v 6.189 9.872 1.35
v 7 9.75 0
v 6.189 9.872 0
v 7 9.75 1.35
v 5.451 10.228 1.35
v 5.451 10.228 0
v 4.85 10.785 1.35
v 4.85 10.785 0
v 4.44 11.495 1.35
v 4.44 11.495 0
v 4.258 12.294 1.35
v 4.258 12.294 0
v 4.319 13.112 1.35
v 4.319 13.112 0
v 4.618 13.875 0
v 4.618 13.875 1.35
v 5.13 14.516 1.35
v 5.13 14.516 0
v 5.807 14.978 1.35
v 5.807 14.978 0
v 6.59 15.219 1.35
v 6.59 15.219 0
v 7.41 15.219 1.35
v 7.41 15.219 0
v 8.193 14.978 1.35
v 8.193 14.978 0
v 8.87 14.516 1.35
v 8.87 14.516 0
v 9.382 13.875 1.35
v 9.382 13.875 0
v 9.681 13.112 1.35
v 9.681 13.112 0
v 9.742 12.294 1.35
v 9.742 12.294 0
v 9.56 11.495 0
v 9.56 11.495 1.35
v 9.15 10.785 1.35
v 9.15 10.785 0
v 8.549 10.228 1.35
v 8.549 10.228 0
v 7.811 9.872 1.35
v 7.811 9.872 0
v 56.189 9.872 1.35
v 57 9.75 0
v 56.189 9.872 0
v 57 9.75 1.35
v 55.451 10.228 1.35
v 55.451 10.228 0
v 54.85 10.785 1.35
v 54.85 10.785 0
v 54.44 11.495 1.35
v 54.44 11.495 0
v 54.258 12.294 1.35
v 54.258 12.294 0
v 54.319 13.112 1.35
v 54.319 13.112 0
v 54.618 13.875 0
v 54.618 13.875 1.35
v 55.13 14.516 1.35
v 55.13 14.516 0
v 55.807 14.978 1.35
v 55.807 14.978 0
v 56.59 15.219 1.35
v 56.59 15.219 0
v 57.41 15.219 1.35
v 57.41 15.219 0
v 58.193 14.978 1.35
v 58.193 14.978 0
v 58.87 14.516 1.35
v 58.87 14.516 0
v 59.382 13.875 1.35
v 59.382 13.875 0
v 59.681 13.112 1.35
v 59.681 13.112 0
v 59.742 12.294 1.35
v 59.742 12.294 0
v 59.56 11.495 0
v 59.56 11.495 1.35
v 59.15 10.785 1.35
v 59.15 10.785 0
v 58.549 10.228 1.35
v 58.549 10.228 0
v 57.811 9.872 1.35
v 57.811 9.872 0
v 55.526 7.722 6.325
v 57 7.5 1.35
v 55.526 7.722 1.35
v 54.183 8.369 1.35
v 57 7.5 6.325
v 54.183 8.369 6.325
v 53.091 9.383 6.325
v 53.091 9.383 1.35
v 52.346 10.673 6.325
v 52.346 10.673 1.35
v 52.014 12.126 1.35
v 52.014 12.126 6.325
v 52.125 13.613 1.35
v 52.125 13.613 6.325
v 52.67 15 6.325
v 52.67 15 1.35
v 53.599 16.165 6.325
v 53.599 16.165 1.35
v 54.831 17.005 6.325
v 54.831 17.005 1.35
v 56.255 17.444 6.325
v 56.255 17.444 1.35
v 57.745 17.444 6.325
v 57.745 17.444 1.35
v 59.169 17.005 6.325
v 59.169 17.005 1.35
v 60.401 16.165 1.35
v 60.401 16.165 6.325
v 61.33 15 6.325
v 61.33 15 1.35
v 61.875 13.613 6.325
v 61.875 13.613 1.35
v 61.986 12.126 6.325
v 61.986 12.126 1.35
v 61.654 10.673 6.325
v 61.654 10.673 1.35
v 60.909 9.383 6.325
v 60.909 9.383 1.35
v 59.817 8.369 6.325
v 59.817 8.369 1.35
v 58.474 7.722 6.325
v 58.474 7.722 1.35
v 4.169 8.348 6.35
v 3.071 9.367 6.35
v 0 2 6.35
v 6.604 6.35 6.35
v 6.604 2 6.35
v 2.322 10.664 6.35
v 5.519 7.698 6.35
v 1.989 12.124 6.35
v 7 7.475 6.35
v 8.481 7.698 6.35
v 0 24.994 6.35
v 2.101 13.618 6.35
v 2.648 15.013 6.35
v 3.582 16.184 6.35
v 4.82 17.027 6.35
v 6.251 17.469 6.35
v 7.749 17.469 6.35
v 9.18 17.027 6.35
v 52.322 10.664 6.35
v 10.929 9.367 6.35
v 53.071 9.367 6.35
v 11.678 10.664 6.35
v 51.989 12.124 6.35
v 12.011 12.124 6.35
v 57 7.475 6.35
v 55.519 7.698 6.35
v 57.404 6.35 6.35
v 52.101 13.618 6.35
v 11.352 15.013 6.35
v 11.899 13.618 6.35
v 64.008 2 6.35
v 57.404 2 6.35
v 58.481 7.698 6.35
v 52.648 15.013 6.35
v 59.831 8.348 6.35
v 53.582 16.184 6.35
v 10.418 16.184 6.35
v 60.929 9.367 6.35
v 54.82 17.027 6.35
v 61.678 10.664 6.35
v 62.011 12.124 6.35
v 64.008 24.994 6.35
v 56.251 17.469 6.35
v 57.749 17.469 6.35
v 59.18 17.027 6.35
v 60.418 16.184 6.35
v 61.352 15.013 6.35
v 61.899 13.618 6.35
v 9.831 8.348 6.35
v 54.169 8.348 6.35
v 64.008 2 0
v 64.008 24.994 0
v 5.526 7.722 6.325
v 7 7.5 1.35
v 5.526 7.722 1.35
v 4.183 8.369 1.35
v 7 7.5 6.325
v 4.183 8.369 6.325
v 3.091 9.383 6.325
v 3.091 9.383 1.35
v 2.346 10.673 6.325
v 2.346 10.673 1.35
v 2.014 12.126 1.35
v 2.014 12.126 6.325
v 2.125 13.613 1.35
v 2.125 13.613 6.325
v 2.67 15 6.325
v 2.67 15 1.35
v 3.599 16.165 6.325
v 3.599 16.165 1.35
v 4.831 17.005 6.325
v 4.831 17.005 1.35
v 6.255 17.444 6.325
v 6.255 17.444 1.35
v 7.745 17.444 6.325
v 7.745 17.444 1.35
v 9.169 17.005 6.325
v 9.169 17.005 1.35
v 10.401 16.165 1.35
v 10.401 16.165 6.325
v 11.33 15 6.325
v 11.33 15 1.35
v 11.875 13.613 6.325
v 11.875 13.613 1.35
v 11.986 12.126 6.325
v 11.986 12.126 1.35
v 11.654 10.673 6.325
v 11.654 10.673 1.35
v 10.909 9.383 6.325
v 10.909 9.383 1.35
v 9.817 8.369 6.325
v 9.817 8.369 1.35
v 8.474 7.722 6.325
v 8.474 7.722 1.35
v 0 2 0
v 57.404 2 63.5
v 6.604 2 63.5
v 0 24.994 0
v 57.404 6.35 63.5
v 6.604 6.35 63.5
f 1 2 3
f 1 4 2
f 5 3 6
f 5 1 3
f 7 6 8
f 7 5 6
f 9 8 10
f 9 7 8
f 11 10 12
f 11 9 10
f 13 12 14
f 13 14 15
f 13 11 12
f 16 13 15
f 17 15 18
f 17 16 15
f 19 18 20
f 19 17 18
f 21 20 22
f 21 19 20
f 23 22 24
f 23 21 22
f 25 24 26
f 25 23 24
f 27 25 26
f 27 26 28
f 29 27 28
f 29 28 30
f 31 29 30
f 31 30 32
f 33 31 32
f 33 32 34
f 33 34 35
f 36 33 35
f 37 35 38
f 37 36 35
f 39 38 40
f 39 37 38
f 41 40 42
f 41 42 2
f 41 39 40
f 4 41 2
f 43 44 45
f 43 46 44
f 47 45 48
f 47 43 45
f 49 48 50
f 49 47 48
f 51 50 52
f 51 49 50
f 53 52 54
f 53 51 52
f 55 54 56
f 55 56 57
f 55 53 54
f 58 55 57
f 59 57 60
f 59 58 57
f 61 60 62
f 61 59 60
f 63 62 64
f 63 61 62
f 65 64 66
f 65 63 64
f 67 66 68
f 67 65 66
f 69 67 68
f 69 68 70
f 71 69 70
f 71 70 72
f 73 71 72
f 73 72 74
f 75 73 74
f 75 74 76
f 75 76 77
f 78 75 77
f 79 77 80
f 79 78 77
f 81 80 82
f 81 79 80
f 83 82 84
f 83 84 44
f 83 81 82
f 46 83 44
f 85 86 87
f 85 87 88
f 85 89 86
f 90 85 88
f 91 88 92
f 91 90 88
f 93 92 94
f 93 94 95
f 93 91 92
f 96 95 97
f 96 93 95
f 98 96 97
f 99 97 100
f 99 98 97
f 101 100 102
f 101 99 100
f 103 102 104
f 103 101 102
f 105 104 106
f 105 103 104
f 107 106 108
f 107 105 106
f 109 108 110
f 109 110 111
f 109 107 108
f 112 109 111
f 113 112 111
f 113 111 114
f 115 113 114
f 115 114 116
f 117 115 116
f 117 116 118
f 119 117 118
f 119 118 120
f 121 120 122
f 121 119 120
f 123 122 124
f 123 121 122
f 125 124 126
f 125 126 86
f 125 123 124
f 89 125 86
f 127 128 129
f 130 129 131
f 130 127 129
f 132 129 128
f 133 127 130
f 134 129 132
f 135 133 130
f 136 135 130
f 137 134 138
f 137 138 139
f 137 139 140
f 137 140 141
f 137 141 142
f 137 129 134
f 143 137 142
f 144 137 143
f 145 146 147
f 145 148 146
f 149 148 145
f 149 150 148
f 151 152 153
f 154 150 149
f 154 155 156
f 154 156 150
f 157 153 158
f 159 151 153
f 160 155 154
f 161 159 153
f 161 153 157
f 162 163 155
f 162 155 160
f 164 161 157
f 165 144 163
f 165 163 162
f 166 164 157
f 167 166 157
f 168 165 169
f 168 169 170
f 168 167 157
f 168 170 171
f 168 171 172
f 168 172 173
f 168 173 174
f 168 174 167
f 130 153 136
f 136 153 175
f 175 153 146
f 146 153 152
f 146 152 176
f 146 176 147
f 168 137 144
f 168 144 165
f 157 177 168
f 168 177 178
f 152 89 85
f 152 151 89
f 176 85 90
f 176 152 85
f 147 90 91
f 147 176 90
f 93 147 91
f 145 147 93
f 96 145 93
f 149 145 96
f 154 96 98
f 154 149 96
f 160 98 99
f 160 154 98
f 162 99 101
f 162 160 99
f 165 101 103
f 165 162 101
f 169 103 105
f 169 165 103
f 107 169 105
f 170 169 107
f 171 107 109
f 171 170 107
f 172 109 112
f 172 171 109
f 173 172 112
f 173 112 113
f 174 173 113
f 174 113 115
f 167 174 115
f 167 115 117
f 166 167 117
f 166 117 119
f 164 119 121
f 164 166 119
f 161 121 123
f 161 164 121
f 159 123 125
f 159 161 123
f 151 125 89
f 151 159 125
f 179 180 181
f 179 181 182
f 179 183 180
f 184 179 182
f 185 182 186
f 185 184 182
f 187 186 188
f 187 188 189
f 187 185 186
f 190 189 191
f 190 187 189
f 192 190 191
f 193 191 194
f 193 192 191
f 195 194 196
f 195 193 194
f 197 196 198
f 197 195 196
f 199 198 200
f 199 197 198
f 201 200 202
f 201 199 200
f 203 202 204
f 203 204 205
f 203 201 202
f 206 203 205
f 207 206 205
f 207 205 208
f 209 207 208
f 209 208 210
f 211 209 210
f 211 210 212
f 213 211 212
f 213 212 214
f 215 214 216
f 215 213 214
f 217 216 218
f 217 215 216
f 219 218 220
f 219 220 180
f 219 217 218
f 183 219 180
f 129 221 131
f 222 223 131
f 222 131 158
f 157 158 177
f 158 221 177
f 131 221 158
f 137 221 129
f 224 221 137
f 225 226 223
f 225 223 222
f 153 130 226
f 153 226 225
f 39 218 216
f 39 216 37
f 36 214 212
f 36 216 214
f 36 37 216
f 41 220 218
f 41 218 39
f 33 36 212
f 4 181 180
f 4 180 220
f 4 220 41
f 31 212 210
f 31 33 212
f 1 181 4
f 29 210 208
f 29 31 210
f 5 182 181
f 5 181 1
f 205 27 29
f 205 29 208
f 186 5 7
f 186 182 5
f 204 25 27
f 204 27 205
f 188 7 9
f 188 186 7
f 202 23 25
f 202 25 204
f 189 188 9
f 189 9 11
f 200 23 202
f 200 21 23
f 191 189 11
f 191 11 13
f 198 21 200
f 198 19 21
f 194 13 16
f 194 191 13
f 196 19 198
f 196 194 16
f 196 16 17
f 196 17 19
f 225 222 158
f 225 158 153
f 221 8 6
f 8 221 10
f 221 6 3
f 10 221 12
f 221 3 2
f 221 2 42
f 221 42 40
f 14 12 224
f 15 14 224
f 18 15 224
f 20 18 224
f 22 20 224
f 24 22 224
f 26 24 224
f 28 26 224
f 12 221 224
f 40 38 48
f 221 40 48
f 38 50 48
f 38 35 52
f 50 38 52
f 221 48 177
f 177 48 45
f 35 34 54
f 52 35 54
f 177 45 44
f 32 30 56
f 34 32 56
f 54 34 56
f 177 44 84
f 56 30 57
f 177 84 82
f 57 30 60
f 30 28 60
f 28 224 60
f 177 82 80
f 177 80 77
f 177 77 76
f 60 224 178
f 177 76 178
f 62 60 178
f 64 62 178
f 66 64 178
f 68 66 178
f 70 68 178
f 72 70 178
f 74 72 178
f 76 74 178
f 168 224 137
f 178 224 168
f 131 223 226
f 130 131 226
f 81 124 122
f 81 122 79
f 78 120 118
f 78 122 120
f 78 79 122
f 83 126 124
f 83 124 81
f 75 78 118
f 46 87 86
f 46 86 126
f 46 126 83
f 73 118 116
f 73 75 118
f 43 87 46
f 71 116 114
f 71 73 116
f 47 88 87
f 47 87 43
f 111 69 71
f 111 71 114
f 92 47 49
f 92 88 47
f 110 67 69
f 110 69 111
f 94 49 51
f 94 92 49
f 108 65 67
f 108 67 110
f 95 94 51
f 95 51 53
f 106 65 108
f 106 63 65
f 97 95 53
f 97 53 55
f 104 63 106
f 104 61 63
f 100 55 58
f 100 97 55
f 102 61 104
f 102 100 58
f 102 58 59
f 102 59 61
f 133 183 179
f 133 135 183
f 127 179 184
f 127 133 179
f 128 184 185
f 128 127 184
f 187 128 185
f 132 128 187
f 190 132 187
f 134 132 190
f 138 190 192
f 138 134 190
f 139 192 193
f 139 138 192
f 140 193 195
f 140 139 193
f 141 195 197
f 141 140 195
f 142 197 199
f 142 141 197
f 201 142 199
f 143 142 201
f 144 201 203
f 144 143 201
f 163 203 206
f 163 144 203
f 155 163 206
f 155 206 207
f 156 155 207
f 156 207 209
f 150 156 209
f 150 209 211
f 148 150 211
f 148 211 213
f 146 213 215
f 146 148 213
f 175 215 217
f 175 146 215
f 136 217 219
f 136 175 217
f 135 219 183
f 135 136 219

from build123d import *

# Parameters (mm, degrees)
SKETCH1_W                     = 64.008
SKETCH1_H                     = 24.9936
BOSS_EXTRUDE1_DEPTH           = 6.35
SKETCH2_W                     = 64.008
SKETCH2_H                     = 6.35
BOSS_EXTRUDE2_DEPTH           = 57.15
CBORE_FOR_M5_SHCS1_AT_2_COUNT = 2
CBORE_FOR_M5_SHCS1_AT_2_PITCH = 50
SKETCH8_W                     = 6.604
SKETCH8_H                     = 6.35
CUT_EXTRUDE1_DEPTH            = 57.15
CUT_EXTRUDE2_DEPTH            = 90.374641845
CUT_EXTRUDE2_DEPTH_BACK       = 90.374641845
SKETCH9_W                     = 64.008
SKETCH9_H                     = 2.000000064


with BuildPart() as part:
    # Sketch1 → Boss-Extrude1 (new body)
    with BuildSketch(Plane.XY):
        with Locations((32.004, 12.4968)):
            Rectangle(SKETCH1_W, SKETCH1_H)
    extrude(amount=BOSS_EXTRUDE1_DEPTH)

    # Sketch2 → Boss-Extrude2 (add)
    with BuildSketch(Plane.XY.offset(6.35)):
        with Locations((32.004, 3.175)):
            Rectangle(SKETCH2_W, SKETCH2_H)
    extrude(amount=BOSS_EXTRUDE2_DEPTH)

    # Sketch7 → CBORE for M5 SHCS1 (revolve, cut)
    with BuildSketch(Plane(origin=(7, 12.5, 6.35), x_dir=(0, -1, 0), z_dir=(1, 0, 0))):
        Polygon((0, 0), (0, 6.35), (2.75, 6.35), (2.75, 5), (5, 5), (5, 0.025), (5.025, 0), align=None)
    cbore_for_m5_shcs1 = revolve(axis=Axis((7, 12.5, 12.7), (0, 0, -1)), mode=Mode.SUBTRACT)

    # CBORE for M5 SHCS1 at 2: CBORE for M5 SHCS1 ×2
    with Locations(*[(i * CBORE_FOR_M5_SHCS1_AT_2_PITCH, 0, 0) for i in range(1, CBORE_FOR_M5_SHCS1_AT_2_COUNT)]):
        add(cbore_for_m5_shcs1, mode=Mode.SUBTRACT)

    # Sketch8 → Cut-Extrude1 (cut)
    with BuildSketch(Plane.XY.offset(63.5)):
        with Locations((3.302, 3.175)):
            Rectangle(SKETCH8_W, SKETCH8_H)
        with Locations((60.706, 3.175)):
            Rectangle(SKETCH8_W, SKETCH8_H)
    extrude(amount=-CUT_EXTRUDE1_DEPTH, mode=Mode.SUBTRACT)

    # Sketch9 → Cut-Extrude2 (cut, two sides: drawn at the far end of the back side and taken through both)
    with BuildSketch(Plane.XY.offset(6.35).offset(-CUT_EXTRUDE2_DEPTH_BACK)):
        with Locations((32.004, 1.000000032)):
            Rectangle(SKETCH9_W, SKETCH9_H)
    extrude(amount=CUT_EXTRUDE2_DEPTH + CUT_EXTRUDE2_DEPTH_BACK, mode=Mode.SUBTRACT)


solid = part.part
